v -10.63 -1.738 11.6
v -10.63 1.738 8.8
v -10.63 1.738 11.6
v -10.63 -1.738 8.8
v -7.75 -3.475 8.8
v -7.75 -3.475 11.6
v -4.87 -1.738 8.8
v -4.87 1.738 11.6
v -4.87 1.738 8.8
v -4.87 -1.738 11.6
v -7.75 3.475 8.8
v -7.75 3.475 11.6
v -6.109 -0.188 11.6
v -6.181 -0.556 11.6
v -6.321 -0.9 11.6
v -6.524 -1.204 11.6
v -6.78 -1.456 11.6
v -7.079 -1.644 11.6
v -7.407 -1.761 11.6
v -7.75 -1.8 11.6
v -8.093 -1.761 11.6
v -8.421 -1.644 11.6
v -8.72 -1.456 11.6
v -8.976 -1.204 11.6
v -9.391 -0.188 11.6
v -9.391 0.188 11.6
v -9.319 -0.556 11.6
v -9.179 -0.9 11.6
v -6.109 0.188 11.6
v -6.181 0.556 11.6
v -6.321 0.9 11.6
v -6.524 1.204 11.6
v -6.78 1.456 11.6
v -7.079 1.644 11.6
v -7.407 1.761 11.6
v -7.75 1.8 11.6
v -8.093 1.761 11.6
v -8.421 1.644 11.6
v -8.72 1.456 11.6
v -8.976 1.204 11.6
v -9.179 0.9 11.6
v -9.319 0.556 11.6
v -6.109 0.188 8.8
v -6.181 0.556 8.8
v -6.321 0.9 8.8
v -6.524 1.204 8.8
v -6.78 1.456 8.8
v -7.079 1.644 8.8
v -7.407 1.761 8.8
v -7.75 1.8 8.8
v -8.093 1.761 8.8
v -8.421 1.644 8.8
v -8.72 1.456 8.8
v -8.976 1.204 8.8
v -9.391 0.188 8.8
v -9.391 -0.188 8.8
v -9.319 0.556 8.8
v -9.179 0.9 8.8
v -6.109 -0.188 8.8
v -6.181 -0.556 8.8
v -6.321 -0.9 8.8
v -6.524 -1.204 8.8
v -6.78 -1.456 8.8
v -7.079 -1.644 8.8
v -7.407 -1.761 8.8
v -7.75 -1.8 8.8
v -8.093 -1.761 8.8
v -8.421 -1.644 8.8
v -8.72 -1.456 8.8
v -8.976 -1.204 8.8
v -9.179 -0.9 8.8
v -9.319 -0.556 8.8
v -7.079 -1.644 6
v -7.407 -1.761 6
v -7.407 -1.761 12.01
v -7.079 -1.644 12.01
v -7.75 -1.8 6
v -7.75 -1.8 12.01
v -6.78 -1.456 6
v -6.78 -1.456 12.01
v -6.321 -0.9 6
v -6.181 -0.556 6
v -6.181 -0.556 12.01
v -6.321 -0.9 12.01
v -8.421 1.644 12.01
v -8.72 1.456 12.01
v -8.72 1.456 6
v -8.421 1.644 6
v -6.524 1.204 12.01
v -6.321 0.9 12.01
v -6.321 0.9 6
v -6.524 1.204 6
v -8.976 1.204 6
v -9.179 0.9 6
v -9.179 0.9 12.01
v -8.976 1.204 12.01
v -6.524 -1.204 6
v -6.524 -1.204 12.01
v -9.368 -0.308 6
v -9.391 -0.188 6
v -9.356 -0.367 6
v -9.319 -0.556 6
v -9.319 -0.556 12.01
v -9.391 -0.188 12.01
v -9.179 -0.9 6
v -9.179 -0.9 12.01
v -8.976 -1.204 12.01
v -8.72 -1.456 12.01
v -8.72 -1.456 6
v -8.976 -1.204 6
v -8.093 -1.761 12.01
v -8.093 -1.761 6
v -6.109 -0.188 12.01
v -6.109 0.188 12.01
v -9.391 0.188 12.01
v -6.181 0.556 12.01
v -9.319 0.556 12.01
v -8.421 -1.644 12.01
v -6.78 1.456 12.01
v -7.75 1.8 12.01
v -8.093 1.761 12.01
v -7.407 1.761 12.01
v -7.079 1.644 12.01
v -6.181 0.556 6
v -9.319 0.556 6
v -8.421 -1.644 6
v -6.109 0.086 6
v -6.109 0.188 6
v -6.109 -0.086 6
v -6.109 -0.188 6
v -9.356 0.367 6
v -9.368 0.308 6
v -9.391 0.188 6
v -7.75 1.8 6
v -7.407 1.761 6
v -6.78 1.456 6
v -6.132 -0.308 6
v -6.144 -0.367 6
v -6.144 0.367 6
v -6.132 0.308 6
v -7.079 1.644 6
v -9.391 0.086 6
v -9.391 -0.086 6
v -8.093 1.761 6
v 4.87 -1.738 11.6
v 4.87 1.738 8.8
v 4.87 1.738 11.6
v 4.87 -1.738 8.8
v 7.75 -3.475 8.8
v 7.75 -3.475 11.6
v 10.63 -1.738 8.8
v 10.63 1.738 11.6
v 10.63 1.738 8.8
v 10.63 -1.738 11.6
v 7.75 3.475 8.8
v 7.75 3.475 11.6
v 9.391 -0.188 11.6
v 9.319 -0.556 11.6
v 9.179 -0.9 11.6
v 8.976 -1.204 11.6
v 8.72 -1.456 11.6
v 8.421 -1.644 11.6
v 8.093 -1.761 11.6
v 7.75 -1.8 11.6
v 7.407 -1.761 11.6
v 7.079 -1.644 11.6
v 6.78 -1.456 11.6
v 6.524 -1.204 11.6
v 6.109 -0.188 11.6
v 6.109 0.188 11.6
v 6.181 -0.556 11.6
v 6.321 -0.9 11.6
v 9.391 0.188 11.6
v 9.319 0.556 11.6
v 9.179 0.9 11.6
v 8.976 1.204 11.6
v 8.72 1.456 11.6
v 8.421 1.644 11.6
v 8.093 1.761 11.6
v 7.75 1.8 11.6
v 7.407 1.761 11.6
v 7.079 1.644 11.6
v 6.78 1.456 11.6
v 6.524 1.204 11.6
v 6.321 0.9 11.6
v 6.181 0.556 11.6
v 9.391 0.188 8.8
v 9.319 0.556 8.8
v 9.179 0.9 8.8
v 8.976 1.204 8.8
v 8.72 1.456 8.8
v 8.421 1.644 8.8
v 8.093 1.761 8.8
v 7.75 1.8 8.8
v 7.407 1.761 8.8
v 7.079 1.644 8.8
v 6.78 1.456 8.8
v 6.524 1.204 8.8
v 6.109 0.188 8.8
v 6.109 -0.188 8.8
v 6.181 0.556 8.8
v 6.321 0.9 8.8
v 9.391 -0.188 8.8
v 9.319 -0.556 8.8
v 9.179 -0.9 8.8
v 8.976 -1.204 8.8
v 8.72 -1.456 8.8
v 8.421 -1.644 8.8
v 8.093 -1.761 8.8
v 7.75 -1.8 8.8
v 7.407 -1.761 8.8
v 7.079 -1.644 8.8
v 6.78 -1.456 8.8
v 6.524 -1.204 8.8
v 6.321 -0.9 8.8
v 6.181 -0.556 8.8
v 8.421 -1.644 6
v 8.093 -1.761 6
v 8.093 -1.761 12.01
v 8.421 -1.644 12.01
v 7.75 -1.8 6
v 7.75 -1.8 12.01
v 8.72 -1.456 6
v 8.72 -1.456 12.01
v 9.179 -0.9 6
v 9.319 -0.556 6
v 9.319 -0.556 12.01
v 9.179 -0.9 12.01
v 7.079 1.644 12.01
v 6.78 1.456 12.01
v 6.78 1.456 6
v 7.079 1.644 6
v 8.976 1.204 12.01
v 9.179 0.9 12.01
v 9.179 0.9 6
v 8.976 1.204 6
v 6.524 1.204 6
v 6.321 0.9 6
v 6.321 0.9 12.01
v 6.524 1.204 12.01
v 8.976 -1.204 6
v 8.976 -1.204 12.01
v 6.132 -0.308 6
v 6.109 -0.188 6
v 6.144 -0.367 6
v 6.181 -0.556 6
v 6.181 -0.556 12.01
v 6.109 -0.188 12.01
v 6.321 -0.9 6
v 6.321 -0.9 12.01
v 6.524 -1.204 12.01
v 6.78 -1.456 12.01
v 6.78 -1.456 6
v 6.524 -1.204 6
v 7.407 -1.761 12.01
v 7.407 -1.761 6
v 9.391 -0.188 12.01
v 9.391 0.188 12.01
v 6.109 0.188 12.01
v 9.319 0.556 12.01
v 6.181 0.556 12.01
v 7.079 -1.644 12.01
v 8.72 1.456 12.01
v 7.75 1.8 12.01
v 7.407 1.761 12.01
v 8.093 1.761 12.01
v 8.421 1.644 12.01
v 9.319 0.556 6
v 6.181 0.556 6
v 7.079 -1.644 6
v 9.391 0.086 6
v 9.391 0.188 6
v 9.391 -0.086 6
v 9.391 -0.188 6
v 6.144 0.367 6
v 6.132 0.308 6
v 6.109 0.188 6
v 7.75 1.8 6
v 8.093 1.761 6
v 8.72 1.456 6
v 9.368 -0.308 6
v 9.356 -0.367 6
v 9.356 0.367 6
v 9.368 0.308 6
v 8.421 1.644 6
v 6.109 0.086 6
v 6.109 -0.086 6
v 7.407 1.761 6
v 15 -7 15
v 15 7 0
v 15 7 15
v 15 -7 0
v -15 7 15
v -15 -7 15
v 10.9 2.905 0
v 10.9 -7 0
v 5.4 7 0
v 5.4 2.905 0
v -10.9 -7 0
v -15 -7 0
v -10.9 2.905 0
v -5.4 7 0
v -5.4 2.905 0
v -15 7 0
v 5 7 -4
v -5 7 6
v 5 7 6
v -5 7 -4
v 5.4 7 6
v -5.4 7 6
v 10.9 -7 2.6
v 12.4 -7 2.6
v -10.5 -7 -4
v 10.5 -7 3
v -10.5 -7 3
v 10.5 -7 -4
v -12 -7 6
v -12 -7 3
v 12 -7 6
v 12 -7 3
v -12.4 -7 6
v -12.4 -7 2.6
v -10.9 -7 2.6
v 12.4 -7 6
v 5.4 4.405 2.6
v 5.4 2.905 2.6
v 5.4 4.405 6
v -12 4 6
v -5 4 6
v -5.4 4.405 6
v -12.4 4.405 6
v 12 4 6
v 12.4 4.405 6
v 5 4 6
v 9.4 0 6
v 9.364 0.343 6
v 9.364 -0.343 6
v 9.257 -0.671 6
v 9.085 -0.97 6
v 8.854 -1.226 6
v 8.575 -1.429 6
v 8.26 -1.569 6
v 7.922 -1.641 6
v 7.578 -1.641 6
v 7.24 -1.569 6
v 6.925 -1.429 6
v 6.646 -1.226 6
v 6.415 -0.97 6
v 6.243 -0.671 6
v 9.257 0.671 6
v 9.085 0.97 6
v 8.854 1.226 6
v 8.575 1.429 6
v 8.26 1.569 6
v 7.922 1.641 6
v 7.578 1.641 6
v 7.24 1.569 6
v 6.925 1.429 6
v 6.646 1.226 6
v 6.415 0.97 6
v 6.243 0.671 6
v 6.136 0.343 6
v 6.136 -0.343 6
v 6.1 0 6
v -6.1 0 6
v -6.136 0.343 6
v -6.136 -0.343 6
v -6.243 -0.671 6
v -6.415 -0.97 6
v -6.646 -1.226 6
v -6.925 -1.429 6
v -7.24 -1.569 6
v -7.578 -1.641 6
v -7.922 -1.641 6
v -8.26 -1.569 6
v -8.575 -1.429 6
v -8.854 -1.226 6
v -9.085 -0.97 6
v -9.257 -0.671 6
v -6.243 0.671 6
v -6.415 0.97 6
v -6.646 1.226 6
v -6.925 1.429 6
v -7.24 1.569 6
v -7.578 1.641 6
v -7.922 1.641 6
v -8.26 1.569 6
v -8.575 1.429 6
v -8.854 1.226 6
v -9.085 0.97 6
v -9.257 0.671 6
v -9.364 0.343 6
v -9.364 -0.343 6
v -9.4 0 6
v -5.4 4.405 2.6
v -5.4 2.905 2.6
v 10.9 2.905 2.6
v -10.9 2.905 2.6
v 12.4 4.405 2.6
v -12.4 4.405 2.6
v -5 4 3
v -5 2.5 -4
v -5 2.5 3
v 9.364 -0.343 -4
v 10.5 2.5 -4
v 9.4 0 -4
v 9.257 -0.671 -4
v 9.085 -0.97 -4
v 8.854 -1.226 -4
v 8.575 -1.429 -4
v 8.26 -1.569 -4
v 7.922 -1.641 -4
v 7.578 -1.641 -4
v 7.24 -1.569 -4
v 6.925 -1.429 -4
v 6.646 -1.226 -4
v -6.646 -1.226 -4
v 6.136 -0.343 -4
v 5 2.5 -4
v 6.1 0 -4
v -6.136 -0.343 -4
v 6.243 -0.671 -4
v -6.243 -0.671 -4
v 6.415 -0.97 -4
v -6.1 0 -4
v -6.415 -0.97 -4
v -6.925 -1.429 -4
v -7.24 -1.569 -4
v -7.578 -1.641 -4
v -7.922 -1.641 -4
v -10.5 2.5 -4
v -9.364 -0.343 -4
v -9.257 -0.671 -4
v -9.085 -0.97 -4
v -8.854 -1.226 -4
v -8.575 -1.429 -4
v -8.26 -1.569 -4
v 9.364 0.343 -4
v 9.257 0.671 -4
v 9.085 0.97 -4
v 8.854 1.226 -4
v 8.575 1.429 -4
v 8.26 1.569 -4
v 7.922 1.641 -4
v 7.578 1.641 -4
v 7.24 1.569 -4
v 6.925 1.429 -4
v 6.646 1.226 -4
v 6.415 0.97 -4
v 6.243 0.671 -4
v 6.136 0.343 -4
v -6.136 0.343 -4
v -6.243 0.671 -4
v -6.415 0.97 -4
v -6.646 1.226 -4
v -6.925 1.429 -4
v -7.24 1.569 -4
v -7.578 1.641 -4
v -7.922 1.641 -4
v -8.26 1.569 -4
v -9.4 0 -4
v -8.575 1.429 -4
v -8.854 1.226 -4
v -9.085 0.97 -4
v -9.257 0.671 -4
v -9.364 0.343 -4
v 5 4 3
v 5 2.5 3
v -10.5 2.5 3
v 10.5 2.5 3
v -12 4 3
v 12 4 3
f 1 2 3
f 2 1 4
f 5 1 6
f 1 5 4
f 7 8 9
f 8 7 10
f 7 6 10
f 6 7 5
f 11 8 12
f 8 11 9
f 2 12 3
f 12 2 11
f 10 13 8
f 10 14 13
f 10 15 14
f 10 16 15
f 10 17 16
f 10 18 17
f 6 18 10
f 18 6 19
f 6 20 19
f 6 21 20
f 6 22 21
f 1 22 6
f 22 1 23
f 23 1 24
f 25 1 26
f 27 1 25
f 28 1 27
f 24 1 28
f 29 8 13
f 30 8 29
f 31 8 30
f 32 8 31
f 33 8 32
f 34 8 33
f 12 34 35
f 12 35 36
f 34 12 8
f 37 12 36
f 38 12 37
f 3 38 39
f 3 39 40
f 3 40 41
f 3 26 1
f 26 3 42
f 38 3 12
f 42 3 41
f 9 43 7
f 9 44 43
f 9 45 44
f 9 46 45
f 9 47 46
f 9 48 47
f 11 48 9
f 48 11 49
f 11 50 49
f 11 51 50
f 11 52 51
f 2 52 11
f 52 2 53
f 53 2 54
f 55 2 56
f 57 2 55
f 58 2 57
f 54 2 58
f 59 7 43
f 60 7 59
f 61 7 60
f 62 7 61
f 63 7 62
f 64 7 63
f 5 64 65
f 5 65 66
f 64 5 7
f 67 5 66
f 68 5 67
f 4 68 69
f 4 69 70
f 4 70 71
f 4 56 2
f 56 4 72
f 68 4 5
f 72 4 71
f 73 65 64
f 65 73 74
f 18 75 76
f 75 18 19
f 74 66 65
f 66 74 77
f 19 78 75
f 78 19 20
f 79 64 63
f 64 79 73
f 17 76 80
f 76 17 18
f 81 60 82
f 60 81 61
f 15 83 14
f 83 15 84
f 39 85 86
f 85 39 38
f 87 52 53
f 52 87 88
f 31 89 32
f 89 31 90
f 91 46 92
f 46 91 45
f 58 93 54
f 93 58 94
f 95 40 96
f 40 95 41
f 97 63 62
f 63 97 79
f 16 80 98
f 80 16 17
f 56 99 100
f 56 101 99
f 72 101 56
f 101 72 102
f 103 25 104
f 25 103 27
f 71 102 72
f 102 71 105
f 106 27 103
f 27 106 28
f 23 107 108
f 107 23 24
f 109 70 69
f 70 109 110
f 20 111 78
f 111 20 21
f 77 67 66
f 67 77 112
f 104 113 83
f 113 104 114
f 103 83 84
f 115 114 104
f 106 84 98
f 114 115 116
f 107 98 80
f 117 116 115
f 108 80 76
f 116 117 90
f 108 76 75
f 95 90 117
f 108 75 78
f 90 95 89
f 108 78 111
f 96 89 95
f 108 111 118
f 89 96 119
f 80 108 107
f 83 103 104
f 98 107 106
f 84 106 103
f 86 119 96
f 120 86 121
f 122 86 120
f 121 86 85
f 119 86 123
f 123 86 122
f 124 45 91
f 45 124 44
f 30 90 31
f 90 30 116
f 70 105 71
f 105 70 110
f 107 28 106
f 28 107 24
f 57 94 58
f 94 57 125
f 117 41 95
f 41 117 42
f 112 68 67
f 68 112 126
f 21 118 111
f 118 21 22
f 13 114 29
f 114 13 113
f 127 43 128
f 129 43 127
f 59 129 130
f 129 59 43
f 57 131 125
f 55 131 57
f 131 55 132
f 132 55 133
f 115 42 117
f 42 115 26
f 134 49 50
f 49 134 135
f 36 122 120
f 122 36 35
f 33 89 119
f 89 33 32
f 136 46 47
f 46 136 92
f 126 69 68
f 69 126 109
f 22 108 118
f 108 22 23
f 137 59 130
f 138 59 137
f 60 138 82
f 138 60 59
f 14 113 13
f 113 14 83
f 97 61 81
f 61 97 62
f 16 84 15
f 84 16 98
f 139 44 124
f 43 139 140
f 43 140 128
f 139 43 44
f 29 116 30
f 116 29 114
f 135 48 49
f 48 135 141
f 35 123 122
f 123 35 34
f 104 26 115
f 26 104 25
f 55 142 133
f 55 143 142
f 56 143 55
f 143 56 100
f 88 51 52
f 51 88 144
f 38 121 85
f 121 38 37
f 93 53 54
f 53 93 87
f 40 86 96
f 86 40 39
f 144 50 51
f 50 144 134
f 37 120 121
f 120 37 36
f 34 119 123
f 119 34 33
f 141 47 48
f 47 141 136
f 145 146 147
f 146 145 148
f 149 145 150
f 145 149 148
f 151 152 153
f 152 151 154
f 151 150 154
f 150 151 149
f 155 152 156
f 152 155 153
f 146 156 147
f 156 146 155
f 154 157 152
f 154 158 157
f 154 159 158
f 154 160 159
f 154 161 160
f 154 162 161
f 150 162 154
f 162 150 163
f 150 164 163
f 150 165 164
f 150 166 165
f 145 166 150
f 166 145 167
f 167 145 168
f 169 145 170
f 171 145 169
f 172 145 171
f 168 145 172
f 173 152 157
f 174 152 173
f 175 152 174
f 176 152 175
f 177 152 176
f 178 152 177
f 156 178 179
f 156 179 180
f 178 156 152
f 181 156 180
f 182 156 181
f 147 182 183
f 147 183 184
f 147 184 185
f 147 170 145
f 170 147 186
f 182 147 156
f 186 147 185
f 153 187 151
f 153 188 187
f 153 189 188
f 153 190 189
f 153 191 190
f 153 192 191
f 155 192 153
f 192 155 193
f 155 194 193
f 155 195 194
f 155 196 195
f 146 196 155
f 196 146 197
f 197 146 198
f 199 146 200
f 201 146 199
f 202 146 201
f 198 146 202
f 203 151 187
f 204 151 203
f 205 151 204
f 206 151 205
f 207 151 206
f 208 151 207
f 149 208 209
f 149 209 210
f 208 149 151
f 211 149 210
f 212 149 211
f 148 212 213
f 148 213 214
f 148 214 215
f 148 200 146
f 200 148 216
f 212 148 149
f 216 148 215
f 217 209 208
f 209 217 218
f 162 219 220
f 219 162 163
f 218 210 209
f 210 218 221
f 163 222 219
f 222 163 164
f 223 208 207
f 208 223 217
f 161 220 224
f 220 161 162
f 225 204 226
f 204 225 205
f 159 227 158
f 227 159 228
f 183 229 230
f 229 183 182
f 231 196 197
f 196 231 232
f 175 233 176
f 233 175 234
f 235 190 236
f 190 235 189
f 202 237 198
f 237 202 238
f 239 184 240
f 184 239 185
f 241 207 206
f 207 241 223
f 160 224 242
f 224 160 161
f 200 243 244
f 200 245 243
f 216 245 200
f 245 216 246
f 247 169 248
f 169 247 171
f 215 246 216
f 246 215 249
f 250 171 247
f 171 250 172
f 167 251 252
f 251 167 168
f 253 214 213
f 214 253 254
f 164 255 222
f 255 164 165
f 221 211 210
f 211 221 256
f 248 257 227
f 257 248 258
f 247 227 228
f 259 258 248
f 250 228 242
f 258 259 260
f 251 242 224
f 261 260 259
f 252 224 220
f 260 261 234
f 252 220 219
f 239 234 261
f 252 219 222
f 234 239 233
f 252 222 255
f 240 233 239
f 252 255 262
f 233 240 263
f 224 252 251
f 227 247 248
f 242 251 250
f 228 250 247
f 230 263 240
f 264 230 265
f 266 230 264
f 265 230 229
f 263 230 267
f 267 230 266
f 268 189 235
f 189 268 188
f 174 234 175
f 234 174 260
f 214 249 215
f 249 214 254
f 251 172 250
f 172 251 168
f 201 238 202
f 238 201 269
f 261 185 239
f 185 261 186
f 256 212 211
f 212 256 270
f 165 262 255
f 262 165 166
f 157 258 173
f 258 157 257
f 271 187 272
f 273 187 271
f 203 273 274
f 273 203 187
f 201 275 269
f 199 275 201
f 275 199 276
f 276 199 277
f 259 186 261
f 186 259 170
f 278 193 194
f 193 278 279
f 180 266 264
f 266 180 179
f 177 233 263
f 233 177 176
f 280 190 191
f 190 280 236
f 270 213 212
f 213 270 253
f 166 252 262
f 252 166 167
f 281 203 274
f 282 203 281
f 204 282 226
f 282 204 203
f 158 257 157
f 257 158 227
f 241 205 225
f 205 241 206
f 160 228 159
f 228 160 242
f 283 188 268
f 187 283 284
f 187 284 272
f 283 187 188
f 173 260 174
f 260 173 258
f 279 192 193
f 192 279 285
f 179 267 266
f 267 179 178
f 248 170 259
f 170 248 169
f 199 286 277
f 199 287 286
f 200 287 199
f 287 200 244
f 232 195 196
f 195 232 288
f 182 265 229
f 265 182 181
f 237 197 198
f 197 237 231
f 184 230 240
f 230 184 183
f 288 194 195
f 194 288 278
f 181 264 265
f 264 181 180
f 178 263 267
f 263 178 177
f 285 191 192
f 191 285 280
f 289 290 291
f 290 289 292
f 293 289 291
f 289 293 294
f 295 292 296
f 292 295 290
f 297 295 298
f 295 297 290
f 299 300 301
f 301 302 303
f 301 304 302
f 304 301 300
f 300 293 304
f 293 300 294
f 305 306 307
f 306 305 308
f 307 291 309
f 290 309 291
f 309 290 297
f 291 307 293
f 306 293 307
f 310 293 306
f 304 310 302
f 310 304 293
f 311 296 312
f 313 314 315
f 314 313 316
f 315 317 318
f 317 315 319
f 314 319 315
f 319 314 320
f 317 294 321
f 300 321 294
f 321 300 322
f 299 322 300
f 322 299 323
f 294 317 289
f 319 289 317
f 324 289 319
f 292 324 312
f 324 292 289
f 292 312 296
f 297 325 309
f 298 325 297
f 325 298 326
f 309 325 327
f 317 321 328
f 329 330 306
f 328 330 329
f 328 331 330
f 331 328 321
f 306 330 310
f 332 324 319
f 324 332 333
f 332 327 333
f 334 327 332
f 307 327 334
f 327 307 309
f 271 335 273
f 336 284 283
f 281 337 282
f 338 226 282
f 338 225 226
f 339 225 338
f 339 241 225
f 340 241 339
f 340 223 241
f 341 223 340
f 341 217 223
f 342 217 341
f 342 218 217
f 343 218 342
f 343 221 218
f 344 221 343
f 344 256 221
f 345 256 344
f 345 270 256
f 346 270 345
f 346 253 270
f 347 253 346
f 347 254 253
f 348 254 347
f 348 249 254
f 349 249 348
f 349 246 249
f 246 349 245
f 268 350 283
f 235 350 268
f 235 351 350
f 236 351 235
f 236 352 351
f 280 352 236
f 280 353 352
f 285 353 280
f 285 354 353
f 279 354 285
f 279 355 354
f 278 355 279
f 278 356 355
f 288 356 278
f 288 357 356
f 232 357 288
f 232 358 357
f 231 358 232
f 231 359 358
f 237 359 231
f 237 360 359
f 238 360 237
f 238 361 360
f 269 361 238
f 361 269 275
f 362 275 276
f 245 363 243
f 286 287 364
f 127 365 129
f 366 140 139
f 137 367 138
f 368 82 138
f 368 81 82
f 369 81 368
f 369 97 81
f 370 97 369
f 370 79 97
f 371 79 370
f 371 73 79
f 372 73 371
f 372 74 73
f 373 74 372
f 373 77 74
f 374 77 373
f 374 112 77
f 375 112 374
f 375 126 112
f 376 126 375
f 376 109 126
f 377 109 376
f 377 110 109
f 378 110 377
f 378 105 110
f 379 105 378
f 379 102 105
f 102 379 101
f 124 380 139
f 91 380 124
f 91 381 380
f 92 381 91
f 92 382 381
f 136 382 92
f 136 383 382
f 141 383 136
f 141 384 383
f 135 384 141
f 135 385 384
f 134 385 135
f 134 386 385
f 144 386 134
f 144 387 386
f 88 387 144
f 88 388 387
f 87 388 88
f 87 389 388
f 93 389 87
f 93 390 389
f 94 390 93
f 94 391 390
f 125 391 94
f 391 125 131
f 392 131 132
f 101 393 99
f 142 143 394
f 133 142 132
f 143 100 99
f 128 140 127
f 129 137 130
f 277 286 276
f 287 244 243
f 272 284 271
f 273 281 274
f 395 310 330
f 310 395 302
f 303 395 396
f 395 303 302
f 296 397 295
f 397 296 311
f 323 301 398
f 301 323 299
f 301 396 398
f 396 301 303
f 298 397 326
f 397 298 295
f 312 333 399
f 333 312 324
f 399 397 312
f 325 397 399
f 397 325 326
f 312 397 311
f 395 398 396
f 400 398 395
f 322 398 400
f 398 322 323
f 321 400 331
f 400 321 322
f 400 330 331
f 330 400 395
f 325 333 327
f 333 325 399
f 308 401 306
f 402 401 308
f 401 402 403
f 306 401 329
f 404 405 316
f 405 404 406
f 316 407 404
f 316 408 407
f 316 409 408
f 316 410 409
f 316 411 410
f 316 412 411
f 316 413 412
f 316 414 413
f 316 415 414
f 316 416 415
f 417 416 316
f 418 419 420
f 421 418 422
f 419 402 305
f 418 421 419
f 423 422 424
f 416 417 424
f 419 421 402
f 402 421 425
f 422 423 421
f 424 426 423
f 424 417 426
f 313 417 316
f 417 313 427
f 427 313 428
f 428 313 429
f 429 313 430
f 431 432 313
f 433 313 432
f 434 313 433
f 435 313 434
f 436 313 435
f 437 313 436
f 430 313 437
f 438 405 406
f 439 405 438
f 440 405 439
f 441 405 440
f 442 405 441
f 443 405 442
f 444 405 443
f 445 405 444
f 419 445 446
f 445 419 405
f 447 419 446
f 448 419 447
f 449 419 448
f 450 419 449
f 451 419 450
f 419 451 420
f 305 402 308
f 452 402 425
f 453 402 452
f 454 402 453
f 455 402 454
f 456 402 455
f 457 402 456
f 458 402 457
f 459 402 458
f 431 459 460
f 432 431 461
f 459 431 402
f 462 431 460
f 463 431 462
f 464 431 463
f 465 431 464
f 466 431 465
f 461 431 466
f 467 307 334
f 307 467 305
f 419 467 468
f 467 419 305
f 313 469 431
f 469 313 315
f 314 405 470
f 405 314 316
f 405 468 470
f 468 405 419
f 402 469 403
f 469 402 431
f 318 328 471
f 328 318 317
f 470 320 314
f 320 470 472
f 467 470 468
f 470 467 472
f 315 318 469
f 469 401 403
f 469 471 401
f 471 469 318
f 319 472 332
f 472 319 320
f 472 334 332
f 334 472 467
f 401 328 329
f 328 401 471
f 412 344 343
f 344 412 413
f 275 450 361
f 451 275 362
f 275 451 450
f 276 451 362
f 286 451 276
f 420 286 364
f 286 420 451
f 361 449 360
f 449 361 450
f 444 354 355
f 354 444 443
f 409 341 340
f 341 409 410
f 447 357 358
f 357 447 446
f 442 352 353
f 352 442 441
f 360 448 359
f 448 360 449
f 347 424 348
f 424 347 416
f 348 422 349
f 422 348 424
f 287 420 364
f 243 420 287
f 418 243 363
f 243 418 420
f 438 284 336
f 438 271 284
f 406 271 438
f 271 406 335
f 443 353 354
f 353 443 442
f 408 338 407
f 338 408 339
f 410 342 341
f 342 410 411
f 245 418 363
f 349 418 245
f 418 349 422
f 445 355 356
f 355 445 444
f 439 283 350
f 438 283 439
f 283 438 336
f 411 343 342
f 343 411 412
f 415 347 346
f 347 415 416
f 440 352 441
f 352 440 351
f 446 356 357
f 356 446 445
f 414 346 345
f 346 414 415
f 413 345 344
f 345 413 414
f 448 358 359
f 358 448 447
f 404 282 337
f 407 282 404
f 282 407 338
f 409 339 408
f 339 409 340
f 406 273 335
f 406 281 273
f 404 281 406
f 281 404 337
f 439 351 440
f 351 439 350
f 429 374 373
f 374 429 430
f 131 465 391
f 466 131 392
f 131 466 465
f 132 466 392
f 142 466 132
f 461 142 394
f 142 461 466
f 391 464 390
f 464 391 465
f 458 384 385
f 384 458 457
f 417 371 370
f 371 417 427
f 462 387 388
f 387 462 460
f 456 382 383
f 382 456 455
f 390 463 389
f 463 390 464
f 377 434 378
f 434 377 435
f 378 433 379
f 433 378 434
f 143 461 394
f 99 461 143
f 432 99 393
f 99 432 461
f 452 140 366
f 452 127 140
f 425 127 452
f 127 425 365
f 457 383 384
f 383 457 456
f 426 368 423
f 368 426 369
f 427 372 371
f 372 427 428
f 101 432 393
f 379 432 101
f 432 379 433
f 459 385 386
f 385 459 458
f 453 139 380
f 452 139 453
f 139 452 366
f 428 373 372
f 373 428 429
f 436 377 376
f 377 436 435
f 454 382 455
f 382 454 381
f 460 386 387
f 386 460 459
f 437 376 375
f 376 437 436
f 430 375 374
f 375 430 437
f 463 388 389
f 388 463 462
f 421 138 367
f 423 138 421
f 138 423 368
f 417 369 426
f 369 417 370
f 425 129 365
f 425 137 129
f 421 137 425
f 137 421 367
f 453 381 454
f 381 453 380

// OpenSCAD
include <./variables.scad>
include <BOSL2/std.scad>

module base() {
  difference() {
    union() {
      rotate([ 90, 0, 90 ]) linear_extrude(base_size.x, center = true)
          base_2d();
      left(base_wall_x) base_wall1();
      right(base_wall_x) base_wall2();
    }

    up(base_size.z + nothing) {
      left(fan_connector_distance) fan_connector_hole_mask();
      right(fan_connector_distance) fan_connector_hole_mask();
      left(base_wall_x - cable_hole_distance_from_wall) cable_hole_mask(LEFT);
      right(base_wall_x - cable_hole_distance_from_wall) cable_hole_mask(RIGHT);
    }
  }
}

module cable_hole_mask(anchor) {
  cube([ cable_hole_size.x, cable_hole_size.y, wall_thickness + nothing * 2 ],
       anchor = TOP + anchor);
}

module fan_connector_hole_mask() {
  size = [
    fan_connector_hole_size.x,
    fan_connector_hole_size.y,
    wall_thickness + nothing * 2,
  ];
  cuboid(size, anchor = TOP);
}

module base_2d() {
  difference() {
    trapezoid(h = base_size.z, w1 = base_size_y_bottom, w2 = base_size_y_top,
              anchor = FWD);

    trapezoid(h = base_size.z - wall_thickness,
              w1 = base_size_y_bottom - wall_thickness * 2,
              w2 = base_size_y_top - wall_thickness * 2, anchor = FWD);
  }
}

module base_wall1() {
  difference() {
    base_wall();
    up(base_size.z / 2) rotate([ 0, 90, 0 ])
        power_socket_mask(wall_thickness + nothing * 2);
  }
}

module power_socket_mask(thickness) {
  linear_extrude(thickness, center = true) intersection() {
    circle(d = power_socket_diameter);
    rect([ power_socket_width, power_socket_diameter ]);
  }
}

module base_wall2() {
  difference() {
    base_wall();
    up(base_size.z / 2) rotate([ 0, 90, 0 ])
        power_switch_mask(wall_thickness + nothing * 2);
  }
}

module power_switch_mask(thickness) {
  linear_extrude(thickness, center = true) intersection() {
    circle(d = power_switch_hole_diameter);
  }

  // nibs
  up(thickness / 4) linear_extrude(thickness / 2, center = true) {
    left(power_switch_nib_dist_from_hole_center)
        rect(power_switch_nib_size, anchor = RIGHT);

    back(power_switch_nib_dist_from_hole_center)
        rect(power_switch_nib_size, anchor = FWD);
  }
}

module base_wall() {
  rotate([ 90, 0, 90 ]) linear_extrude(wall_thickness, center = true)
      difference() {
    trapezoid(h = base_size.z - nothing, w1 = base_size_y_bottom - nothing,
              w2 = base_size_y_top - nothing, anchor = FWD);

    back(bottom_connector_hole_distance)
        circle(d = bottom_connector_base_hole_diameter);
  }
}
